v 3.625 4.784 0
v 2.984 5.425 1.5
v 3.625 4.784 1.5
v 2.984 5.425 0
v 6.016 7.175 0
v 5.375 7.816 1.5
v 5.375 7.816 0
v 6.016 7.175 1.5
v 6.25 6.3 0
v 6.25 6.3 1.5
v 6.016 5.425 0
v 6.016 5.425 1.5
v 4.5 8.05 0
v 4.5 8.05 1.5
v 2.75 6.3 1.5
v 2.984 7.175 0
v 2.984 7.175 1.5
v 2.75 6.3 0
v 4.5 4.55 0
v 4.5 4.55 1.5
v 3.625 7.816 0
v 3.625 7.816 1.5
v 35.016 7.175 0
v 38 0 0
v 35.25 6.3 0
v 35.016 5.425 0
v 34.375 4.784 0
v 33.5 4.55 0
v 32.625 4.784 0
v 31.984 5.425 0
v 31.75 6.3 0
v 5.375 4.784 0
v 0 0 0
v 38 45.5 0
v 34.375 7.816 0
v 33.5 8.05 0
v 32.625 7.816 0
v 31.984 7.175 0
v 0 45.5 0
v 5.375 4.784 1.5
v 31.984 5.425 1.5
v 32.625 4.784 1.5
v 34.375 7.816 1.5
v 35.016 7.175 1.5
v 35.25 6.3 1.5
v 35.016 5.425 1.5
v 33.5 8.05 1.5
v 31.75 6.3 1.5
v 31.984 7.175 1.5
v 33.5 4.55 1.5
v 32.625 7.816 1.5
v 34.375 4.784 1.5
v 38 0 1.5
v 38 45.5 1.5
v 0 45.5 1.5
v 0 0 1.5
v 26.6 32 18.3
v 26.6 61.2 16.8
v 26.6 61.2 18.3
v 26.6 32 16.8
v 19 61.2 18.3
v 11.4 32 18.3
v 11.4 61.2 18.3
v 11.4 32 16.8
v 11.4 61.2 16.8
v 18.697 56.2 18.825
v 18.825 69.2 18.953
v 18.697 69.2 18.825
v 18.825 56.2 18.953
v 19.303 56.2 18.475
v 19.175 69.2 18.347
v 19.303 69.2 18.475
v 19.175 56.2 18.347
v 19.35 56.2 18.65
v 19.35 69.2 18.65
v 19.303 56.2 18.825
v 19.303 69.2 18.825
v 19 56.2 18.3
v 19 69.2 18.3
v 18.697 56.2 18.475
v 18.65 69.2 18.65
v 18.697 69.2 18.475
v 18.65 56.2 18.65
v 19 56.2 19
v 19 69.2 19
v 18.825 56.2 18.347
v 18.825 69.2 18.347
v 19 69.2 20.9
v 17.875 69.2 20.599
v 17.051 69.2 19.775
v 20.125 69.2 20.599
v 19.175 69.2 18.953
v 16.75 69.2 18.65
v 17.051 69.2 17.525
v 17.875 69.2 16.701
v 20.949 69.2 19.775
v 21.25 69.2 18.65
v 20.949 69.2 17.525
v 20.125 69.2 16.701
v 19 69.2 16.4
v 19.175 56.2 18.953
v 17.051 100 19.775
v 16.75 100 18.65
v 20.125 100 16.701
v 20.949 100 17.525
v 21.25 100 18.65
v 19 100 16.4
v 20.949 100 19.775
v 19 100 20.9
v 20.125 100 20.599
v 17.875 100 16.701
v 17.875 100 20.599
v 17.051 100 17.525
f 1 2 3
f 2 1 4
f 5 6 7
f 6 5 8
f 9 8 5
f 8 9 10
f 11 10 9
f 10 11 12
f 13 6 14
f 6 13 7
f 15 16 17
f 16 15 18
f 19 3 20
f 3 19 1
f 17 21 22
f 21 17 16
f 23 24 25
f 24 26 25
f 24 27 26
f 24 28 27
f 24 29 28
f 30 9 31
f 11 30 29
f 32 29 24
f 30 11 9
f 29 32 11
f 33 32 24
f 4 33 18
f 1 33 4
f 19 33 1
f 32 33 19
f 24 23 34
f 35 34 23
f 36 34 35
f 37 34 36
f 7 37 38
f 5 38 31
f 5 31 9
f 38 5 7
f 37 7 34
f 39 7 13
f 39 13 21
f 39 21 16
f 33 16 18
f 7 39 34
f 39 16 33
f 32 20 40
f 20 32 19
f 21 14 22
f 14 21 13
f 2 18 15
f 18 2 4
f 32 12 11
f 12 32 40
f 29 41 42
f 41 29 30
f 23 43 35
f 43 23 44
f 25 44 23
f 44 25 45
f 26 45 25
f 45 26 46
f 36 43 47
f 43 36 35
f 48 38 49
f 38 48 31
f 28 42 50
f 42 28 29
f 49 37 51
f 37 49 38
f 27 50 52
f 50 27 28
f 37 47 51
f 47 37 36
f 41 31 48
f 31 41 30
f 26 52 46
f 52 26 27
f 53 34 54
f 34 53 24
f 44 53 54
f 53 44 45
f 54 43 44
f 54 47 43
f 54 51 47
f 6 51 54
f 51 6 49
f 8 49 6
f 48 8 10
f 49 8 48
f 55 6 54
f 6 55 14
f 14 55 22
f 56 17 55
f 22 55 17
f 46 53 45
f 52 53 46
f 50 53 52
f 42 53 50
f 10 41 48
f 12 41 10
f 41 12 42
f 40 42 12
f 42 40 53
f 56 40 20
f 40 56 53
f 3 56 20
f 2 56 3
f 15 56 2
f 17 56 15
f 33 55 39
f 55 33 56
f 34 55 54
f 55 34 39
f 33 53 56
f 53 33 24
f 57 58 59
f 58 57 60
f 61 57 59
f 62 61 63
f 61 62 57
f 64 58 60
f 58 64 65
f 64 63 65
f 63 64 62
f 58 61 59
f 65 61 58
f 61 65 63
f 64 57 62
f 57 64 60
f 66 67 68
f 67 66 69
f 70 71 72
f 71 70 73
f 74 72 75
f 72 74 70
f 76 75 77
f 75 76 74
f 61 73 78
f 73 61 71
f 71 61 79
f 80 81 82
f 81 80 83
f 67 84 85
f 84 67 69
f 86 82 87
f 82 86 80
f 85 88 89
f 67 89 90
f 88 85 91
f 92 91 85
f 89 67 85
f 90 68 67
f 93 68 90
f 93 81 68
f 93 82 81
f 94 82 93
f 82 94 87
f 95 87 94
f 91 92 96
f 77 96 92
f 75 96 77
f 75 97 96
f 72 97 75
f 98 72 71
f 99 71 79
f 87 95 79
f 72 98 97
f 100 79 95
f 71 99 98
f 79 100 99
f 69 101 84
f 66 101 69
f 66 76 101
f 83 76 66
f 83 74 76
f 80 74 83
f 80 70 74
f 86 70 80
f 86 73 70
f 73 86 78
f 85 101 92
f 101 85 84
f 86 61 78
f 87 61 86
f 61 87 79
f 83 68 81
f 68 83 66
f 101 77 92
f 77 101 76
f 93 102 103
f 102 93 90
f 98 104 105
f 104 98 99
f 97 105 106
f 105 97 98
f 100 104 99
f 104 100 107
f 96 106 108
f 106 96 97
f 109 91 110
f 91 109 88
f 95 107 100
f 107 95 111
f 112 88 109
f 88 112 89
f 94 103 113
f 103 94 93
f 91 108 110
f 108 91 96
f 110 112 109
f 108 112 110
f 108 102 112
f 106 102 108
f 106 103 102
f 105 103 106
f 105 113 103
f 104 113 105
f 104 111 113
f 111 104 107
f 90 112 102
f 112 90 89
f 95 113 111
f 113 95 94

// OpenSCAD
$fn = 12;

module sensor() {
    pcb_size = [38, 45.5, 1.5];
    radio_size = [15.2, 29.2, 1.5];
    distance = 15.3;
    radio_offset = [(pcb_size[0] - radio_size[0]) / 2, pcb_size[1] - 13.5, distance + pcb_size[2]];
    
    module mainboard(size=pcb_size)
    {
        hole_d = 3.5;
        difference() {
            union() {
                // pcb
                cube(size);
                // component space
                %translate([0, 0, pcb_size[2]])
                cube(size+[0,0,distance-pcb_size[2]]);
            }
            
            // mount holes
            for (i = [4.5, size[0] - 4.5]) {
                translate([i, 6.3, 0])
                cylinder(h=size[2] + distance, r=hole_d/2);
            }
        }
    }
    
    module radio(size=radio_size) {
        ant_d1 = 0.7;
        ant_d2 = 4.5;
        ant_length = 30.8;
        ant_leg = 8;

        // pcb
        cube(size);

        // antenna leg
        translate([size[0]/2, size[1] - 5, size[2] + ant_d1/2])
        rotate([-90, 0, 0])
        cylinder(h=ant_leg+5,d=ant_d1);

        // antenna spring
        translate([size[0]/2, size[1] + ant_leg, size[2] + ant_d1/2])
        rotate([-90, 0, 0])
        cylinder(h=ant_length, r=ant_d2/2);
    }

    mainboard();
    translate(radio_offset) radio();
}

sensor();
